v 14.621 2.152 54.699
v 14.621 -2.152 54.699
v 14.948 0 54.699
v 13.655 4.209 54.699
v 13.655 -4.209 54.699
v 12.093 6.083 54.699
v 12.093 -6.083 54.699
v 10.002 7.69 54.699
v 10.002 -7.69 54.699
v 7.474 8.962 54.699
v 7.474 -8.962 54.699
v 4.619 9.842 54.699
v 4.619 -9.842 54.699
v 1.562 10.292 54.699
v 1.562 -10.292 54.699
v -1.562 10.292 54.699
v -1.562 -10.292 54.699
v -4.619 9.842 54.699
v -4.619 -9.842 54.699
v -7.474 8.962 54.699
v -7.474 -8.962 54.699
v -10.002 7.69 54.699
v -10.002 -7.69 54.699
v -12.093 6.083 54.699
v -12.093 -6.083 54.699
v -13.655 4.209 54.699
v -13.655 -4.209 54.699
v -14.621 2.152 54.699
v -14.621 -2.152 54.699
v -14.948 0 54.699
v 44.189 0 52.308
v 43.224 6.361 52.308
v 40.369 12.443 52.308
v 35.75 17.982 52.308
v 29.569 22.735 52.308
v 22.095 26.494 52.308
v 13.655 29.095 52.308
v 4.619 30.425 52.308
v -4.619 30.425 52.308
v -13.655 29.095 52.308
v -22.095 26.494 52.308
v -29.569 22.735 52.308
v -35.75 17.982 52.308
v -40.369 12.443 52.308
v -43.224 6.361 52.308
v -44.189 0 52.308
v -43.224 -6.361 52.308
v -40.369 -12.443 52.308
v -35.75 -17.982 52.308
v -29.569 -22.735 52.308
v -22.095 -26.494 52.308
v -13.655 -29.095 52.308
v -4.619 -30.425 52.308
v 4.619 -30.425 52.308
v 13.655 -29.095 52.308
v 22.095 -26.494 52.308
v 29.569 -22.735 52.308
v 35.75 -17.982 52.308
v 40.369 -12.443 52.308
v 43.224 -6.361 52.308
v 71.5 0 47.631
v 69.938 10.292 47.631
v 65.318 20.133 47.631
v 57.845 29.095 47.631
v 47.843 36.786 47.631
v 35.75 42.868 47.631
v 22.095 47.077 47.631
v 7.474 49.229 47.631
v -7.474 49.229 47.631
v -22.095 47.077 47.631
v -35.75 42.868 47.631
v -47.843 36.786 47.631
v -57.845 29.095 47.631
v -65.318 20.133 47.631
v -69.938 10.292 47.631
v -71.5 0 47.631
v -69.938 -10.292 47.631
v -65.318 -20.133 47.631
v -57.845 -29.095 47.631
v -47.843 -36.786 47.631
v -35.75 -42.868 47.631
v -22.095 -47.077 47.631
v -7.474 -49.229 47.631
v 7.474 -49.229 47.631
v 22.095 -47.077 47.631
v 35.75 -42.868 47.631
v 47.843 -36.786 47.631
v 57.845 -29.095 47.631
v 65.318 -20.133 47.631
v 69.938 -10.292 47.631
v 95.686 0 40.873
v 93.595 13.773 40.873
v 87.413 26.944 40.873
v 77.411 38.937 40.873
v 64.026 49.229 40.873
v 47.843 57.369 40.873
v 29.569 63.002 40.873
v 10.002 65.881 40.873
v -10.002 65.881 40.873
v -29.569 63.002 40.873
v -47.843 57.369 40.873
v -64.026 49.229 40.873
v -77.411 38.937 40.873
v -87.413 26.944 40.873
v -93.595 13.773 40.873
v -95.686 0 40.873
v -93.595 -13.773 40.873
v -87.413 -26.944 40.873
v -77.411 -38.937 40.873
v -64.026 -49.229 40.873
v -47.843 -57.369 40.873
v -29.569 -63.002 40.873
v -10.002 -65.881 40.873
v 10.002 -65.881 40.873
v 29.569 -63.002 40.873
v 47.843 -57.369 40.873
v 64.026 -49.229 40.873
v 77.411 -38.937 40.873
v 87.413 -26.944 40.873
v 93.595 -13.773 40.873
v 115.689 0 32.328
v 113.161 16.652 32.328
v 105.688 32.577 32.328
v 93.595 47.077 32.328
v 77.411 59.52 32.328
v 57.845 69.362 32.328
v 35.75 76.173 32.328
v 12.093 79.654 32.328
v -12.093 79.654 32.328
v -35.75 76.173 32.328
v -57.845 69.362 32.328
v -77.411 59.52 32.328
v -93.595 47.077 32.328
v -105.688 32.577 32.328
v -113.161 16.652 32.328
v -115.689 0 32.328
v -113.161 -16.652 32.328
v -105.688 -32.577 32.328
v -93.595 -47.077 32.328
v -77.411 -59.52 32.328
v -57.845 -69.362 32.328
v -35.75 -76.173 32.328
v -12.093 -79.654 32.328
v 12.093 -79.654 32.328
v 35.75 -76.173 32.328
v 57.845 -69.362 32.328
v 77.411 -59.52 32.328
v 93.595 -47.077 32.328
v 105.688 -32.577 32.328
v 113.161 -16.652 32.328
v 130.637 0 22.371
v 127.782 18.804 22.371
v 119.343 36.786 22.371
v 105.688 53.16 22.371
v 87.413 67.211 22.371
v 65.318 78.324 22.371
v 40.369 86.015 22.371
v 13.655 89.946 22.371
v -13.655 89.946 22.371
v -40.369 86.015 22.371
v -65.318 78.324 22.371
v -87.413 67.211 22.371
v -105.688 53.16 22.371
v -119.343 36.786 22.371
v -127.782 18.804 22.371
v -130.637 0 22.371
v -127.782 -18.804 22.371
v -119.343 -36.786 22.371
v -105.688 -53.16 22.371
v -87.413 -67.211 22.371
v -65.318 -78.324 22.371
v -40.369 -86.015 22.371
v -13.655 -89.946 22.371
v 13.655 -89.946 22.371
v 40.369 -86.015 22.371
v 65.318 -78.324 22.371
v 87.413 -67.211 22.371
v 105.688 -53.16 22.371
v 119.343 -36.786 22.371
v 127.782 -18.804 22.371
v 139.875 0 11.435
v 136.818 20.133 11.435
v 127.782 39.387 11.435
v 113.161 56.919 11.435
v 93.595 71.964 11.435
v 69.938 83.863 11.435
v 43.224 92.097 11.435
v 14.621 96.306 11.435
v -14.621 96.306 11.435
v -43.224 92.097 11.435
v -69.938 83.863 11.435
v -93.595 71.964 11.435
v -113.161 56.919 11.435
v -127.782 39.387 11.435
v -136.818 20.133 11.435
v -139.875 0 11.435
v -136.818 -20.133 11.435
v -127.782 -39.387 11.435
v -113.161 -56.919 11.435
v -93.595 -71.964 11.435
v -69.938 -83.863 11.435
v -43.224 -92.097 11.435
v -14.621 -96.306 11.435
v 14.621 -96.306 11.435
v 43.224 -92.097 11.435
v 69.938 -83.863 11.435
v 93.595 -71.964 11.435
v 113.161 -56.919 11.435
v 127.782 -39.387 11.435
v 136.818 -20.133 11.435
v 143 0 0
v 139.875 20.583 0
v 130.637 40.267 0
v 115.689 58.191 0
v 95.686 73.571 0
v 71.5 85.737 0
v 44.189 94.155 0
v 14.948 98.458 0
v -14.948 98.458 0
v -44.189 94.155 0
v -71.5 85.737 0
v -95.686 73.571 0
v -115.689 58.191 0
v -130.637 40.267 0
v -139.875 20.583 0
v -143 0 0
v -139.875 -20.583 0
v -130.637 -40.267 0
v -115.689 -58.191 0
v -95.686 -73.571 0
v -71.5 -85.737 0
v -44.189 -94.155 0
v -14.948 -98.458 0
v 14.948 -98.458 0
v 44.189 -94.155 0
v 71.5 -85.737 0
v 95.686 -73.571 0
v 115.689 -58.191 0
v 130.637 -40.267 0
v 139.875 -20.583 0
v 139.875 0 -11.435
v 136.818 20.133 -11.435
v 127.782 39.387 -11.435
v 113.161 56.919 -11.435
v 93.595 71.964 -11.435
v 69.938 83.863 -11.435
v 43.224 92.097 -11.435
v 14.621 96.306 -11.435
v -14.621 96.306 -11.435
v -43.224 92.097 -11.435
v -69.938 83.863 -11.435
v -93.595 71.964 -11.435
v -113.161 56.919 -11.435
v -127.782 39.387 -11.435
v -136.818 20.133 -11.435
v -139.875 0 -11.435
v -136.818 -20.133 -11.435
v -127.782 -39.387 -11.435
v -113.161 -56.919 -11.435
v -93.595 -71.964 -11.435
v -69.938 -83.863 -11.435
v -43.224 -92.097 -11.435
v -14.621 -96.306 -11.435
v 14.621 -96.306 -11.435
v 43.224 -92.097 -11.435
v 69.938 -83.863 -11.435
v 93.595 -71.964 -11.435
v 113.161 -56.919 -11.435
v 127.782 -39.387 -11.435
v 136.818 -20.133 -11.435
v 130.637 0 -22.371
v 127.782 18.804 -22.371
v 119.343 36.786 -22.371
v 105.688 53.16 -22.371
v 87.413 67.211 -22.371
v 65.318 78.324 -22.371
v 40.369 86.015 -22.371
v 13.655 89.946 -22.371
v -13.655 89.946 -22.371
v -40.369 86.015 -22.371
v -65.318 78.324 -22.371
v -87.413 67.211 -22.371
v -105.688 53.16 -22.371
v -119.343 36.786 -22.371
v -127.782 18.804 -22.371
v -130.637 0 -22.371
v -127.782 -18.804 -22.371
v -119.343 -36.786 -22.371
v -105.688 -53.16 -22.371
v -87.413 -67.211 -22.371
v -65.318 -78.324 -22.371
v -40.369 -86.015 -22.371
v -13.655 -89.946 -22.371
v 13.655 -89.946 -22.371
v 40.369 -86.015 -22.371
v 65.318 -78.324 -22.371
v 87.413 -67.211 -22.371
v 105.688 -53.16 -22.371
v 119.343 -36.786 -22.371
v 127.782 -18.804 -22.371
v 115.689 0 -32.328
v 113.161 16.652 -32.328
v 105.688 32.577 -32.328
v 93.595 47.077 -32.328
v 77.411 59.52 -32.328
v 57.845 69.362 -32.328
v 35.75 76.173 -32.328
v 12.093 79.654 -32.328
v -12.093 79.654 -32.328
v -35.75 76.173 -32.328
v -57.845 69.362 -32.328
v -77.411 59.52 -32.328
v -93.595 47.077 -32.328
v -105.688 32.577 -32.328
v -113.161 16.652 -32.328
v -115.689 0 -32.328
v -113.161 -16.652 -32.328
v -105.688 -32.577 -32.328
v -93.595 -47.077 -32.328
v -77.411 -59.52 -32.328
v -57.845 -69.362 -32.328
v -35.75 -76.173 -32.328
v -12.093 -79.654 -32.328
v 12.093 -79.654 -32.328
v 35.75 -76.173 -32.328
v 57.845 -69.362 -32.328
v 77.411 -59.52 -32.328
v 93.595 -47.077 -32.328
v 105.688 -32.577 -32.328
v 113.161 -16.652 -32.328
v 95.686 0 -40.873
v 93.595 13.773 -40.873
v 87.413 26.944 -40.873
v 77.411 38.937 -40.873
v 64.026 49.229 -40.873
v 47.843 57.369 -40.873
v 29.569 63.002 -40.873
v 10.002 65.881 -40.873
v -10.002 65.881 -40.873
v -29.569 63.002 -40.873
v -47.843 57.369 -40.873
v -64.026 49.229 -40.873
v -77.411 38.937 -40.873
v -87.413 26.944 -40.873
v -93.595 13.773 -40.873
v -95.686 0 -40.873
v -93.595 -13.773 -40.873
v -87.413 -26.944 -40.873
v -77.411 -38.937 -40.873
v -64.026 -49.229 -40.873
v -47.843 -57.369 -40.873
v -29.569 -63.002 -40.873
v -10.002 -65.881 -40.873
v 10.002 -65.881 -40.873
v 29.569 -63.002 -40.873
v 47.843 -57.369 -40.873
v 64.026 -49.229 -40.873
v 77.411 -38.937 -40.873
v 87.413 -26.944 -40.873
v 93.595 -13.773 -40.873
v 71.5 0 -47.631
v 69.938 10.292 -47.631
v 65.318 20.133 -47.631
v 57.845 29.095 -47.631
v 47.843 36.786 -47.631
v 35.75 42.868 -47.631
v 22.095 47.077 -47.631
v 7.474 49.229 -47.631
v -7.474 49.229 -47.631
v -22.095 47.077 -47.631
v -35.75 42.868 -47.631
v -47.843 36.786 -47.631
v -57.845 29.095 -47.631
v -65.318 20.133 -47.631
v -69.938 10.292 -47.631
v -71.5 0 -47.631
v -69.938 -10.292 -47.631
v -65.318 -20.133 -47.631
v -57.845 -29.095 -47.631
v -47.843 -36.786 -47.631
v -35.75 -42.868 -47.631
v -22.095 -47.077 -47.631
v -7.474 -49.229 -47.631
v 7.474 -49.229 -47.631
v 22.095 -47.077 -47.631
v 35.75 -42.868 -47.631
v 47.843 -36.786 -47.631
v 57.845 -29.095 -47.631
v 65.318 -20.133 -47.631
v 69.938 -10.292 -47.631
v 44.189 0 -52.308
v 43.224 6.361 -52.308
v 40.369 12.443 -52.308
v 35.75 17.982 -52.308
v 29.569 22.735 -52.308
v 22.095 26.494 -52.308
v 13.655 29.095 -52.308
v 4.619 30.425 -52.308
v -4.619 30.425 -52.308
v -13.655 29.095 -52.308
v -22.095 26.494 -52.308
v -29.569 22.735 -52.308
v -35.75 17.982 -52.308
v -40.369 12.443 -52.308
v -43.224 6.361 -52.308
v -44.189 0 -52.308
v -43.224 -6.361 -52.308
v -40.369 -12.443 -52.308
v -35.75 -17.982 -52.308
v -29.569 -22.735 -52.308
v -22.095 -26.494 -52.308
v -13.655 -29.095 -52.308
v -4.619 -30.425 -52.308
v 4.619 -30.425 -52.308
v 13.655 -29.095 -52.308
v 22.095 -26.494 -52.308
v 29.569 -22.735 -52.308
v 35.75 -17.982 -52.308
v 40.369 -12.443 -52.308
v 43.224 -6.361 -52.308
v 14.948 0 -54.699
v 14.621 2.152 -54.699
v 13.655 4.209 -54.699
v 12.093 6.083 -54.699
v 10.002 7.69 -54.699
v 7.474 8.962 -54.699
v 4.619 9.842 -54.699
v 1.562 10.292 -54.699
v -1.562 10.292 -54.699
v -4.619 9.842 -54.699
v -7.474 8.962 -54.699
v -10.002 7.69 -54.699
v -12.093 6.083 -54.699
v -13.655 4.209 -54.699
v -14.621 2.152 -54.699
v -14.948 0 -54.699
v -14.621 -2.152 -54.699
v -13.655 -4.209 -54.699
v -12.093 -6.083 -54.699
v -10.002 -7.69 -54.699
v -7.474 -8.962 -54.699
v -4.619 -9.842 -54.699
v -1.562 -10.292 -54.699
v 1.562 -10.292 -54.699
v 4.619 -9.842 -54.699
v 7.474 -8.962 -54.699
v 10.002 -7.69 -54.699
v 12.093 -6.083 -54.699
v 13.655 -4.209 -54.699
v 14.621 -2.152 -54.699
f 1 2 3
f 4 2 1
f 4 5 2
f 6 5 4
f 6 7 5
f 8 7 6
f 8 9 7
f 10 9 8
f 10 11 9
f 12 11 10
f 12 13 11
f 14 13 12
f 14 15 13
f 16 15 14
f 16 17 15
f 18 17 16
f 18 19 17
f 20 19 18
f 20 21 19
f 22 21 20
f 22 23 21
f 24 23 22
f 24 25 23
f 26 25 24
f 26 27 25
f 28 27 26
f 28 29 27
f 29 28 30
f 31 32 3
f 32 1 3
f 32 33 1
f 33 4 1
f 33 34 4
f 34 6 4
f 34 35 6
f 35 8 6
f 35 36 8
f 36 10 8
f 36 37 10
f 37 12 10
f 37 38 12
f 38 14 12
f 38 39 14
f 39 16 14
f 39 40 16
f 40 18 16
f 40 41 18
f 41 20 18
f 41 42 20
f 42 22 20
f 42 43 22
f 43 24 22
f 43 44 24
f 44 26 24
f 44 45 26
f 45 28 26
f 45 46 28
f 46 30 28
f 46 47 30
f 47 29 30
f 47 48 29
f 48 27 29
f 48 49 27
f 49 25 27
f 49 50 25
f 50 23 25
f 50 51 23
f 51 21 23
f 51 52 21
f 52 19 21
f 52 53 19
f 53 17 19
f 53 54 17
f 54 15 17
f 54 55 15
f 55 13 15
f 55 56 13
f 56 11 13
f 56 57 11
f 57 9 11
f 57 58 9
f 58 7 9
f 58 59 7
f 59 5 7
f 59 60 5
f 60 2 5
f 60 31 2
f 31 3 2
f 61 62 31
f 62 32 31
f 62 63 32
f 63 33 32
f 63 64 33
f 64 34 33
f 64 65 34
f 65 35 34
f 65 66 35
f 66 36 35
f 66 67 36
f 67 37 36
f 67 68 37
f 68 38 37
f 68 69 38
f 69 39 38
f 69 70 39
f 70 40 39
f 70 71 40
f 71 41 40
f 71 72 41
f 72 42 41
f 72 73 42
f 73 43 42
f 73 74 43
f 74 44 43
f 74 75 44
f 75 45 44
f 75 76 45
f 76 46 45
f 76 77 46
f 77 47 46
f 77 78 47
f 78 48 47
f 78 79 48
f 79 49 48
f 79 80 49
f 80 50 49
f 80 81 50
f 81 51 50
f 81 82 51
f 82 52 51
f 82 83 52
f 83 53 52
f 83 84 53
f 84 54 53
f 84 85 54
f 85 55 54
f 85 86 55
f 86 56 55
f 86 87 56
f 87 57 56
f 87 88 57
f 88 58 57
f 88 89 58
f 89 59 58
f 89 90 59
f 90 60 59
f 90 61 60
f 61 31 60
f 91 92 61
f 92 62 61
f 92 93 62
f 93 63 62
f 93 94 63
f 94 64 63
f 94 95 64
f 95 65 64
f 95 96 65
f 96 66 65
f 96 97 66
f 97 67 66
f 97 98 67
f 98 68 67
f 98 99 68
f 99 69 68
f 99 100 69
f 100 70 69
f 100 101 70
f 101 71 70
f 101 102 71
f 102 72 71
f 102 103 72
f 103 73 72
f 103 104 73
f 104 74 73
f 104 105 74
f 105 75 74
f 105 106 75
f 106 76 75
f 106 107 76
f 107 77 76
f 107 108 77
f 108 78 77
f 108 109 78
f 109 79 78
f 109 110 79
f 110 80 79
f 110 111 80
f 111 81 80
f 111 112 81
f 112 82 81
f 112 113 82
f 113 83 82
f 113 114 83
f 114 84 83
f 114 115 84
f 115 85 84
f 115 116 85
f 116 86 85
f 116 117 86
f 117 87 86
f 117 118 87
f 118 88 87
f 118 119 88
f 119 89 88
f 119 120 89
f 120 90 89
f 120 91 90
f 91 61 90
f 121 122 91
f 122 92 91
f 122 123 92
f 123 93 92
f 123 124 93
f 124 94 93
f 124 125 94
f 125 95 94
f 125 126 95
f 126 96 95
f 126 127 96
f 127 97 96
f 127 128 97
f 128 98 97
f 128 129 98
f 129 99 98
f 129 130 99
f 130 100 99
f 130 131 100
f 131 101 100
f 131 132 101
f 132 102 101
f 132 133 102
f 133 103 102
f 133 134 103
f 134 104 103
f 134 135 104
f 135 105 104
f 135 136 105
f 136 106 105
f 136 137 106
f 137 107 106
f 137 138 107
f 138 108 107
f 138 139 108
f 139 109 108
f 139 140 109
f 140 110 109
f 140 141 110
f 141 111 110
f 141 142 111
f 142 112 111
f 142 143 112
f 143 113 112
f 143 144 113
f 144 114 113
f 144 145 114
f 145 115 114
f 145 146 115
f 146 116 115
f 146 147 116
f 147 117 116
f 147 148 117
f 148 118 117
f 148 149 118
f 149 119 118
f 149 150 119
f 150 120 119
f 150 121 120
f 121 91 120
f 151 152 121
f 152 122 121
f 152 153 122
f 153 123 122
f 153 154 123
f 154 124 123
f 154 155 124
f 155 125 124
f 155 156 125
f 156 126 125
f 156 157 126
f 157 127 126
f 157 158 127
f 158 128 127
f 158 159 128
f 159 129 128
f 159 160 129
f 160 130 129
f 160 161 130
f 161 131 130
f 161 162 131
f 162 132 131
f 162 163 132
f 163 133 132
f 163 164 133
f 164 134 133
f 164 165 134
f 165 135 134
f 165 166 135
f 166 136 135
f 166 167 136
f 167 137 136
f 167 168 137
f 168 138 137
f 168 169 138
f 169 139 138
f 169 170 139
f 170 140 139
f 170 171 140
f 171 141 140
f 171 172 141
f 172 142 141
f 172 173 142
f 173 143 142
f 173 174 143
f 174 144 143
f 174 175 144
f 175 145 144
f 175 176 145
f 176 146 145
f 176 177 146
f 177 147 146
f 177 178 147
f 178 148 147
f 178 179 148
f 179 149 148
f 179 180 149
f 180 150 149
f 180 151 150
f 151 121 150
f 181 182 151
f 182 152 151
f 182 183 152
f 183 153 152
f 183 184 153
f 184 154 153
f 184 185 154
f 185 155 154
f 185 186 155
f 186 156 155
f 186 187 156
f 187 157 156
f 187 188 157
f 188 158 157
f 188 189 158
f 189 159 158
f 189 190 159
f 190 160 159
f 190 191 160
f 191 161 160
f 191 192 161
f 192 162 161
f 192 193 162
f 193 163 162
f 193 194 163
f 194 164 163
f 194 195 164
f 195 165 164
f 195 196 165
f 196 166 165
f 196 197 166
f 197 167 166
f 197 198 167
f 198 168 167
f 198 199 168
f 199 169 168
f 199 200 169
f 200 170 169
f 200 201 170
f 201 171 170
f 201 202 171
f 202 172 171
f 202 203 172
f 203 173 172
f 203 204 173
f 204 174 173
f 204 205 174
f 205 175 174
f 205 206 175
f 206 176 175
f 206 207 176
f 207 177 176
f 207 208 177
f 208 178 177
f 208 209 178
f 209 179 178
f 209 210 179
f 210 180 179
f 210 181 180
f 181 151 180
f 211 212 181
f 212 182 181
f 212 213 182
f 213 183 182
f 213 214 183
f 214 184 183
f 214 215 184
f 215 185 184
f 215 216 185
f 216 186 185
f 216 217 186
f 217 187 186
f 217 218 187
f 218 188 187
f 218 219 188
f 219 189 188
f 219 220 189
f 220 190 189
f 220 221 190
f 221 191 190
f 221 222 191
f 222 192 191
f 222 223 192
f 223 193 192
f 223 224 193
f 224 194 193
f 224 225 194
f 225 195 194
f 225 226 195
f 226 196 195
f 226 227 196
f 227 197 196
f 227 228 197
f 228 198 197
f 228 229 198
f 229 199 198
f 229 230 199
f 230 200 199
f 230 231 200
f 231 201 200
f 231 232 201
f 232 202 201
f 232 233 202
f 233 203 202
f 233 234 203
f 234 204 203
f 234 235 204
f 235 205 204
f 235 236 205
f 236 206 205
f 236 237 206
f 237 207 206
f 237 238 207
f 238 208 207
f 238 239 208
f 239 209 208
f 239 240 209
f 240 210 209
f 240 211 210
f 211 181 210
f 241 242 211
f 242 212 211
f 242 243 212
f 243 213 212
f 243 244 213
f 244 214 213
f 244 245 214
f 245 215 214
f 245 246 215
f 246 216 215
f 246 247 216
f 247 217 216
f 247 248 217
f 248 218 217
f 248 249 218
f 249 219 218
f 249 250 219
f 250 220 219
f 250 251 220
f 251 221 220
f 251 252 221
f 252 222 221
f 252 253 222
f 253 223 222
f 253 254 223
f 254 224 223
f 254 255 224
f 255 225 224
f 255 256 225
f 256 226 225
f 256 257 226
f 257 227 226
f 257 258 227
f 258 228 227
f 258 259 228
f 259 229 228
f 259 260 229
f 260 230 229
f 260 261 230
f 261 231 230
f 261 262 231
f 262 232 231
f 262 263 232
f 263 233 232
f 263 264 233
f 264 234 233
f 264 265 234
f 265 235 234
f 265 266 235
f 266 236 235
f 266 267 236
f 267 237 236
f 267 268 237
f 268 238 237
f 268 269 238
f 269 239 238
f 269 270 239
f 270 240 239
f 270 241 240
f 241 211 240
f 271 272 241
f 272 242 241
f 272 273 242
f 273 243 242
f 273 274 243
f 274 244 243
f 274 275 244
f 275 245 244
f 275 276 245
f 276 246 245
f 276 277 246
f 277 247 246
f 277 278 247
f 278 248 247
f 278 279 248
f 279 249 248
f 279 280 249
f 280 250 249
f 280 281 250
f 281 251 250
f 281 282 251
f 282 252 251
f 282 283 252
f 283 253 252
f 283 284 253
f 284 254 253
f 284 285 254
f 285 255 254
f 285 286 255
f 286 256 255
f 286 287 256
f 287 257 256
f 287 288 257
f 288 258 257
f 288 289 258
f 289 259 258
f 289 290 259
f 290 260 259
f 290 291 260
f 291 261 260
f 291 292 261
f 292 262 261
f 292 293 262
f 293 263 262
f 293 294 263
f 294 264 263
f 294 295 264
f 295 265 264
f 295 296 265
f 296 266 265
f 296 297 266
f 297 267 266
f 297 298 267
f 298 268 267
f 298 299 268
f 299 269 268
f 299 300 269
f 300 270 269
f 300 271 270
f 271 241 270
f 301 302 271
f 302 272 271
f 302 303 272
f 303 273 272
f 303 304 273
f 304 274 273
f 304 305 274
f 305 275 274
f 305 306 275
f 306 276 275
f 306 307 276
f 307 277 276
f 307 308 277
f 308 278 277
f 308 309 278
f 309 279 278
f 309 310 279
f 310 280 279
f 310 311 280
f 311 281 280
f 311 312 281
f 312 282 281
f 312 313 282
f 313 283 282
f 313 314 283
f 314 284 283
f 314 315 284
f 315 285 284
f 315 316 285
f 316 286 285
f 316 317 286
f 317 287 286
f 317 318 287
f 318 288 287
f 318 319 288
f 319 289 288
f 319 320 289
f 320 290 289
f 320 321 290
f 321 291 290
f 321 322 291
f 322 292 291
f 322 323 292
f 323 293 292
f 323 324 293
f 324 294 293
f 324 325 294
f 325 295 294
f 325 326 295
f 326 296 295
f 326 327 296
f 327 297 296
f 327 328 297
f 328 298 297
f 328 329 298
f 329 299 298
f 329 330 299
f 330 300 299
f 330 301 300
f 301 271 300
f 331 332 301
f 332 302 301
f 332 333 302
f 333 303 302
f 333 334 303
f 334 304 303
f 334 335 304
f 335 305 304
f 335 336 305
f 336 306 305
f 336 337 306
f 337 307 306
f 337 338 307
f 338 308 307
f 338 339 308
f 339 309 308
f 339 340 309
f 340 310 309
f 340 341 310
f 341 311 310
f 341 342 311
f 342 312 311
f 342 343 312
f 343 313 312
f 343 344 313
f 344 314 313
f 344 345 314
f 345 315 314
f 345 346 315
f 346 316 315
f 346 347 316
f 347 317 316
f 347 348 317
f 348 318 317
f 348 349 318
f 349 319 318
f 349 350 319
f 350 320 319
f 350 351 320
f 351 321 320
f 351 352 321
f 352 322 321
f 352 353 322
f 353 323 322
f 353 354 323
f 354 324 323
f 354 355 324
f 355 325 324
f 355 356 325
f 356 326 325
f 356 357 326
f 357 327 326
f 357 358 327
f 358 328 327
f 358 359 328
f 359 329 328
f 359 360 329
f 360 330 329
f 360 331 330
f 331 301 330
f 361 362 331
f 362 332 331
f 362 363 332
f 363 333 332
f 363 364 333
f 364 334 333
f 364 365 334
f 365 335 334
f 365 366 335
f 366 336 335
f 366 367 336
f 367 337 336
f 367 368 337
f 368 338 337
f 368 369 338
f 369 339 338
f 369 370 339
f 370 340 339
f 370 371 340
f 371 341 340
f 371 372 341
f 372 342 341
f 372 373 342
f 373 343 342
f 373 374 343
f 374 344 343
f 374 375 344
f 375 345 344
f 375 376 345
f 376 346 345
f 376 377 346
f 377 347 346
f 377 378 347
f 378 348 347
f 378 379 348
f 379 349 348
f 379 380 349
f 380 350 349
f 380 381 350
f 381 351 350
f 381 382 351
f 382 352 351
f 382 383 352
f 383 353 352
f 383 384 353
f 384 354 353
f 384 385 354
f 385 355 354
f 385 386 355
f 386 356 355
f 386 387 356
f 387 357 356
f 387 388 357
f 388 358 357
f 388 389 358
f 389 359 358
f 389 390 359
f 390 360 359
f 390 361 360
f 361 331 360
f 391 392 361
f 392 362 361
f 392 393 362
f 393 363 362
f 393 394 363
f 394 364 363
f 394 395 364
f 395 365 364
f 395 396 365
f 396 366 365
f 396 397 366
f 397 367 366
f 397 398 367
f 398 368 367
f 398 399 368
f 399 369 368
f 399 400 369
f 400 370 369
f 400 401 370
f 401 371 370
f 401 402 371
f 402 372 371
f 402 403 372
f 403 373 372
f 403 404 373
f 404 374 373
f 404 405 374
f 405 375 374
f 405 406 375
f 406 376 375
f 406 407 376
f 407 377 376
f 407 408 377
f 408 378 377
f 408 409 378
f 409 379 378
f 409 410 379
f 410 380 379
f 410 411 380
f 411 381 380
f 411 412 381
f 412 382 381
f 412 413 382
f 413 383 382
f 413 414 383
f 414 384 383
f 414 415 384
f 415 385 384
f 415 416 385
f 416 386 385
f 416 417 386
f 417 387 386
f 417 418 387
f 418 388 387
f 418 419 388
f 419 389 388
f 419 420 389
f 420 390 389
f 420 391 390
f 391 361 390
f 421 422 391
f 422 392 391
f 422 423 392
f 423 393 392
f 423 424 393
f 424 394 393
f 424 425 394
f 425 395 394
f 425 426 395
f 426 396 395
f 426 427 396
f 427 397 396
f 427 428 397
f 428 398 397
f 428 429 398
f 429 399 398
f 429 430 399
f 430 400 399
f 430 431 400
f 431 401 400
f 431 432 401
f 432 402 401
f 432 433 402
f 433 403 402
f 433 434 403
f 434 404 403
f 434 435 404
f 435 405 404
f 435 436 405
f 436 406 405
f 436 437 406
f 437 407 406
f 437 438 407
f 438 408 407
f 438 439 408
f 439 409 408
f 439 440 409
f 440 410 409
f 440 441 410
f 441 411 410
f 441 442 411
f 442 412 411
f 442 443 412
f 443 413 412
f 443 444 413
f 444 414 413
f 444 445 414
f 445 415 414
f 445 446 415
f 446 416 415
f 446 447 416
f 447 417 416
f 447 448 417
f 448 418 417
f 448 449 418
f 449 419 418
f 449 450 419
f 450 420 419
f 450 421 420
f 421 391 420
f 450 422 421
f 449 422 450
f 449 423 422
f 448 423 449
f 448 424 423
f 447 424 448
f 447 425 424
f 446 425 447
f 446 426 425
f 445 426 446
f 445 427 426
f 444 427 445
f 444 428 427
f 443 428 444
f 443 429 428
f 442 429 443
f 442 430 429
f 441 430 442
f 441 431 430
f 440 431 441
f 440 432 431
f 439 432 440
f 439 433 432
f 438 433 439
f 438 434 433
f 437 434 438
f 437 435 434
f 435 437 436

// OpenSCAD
// Generated by SolidPython 1.0.1 on 2020-07-29 00:46:50


scale(v = [13, 9, 5]) {
	sphere(r = 11);
}
/***********************************************
*********      SolidPython code:      **********
************************************************
 
# import packages: SolidPython
from solid import *
from solid.utils import *
from itertools import chain, combinations, permutations


class Resize:

    def __init__(self, scad_file):
        self.scad_file = scad_file
        #self.scad_file = import_scad(scad_file)
        # cone/cylinder param:
        self.r1 = 0
        self.r2 = 0
        self.h = 0
        # rectangular prism param:
        self.w = 0
        self.l = 0
        # ellipse param:
        self.r = 0

    # import OpenScad code (file name corresponds to shape)


    # classify shape + parameters
    def assign(self, param1, param2, param3):
        if self.scad_file == 'cone.scad':
            self.r1 = param1
            self.r2 = param2
            self.h = param3
        elif self.scad_file == 'cylinder.scad':
            self.r1 = param1
            self.r2 = param2
            self.h = param3
        elif self.scad_file == 'rectangularPrism.scad':
            self.h = param1
            self.l = param2
            self.w = param3
        else:
            self.r = param1
            self.h = param2

    # resize parameters
    def iterate(self):
        x = range(3, 20, 2)
        i = 1
        if self.scad_file == 'cone.scad':
            tempList = list(permutations(x, 2))
            for temp in tempList:
                param1 = temp[0]
                param2 = temp[1]
                filepath = 'produced_scad_files/' + 'cone' + str(param1) + '_' + str(param2) + '_' + '.scad'
                scad_render_to_file(cylinder(h=param1, r1=param2, r2=0), filepath)

        elif self.scad_file == 'cylinder.scad':
            tempList = list(permutations(x, 3))
            for temp in tempList:
                param1 = temp[0]
                param2 = temp[1]
                filepath = 'produced_scad_files/' + 'cylinder' + str(param1) + '_' + str(param2) + '_' + '.scad'
                scad_render_to_file(cylinder(h=param1, r1=param2, r2=param2), filepath)

        elif self.scad_file == 'rectangularPrism.scad':
            tempList = list(permutations(x, 3))
            for temp in tempList:
                param1 = temp[0]
                param2 = temp[1]
                param3 = temp[2]
                filepath = 'produced_scad_files/' + 'rectangularPrism' + str(param1) + '_' + str(param2) + '_' + str(
                    param3) + '.scad'
                scad_render_to_file(cube(size=(param1, param2, param3)), filepath)

        elif self.scad_file == 'ellipse.scad':
            tempList = list(permutations(x, 4))
            for temp in tempList:
                param1 = temp[0]
                param2 = temp[1]
                param3 = temp[2]
                param4 = temp[3]
                filepath = 'produced_scad_files/' + 'ellipse' + str(param1) + '_' + str(param2) + '_' + str(param3) + '_' + str(param4) + '.scad'
                scad_render_to_file(scale([param1, param2, param3])(sphere(r=param4)), filepath)

    def render_to_scadfile(self):
        scad_render_to_file(scad, 'example.scad') 
 
************************************************/
